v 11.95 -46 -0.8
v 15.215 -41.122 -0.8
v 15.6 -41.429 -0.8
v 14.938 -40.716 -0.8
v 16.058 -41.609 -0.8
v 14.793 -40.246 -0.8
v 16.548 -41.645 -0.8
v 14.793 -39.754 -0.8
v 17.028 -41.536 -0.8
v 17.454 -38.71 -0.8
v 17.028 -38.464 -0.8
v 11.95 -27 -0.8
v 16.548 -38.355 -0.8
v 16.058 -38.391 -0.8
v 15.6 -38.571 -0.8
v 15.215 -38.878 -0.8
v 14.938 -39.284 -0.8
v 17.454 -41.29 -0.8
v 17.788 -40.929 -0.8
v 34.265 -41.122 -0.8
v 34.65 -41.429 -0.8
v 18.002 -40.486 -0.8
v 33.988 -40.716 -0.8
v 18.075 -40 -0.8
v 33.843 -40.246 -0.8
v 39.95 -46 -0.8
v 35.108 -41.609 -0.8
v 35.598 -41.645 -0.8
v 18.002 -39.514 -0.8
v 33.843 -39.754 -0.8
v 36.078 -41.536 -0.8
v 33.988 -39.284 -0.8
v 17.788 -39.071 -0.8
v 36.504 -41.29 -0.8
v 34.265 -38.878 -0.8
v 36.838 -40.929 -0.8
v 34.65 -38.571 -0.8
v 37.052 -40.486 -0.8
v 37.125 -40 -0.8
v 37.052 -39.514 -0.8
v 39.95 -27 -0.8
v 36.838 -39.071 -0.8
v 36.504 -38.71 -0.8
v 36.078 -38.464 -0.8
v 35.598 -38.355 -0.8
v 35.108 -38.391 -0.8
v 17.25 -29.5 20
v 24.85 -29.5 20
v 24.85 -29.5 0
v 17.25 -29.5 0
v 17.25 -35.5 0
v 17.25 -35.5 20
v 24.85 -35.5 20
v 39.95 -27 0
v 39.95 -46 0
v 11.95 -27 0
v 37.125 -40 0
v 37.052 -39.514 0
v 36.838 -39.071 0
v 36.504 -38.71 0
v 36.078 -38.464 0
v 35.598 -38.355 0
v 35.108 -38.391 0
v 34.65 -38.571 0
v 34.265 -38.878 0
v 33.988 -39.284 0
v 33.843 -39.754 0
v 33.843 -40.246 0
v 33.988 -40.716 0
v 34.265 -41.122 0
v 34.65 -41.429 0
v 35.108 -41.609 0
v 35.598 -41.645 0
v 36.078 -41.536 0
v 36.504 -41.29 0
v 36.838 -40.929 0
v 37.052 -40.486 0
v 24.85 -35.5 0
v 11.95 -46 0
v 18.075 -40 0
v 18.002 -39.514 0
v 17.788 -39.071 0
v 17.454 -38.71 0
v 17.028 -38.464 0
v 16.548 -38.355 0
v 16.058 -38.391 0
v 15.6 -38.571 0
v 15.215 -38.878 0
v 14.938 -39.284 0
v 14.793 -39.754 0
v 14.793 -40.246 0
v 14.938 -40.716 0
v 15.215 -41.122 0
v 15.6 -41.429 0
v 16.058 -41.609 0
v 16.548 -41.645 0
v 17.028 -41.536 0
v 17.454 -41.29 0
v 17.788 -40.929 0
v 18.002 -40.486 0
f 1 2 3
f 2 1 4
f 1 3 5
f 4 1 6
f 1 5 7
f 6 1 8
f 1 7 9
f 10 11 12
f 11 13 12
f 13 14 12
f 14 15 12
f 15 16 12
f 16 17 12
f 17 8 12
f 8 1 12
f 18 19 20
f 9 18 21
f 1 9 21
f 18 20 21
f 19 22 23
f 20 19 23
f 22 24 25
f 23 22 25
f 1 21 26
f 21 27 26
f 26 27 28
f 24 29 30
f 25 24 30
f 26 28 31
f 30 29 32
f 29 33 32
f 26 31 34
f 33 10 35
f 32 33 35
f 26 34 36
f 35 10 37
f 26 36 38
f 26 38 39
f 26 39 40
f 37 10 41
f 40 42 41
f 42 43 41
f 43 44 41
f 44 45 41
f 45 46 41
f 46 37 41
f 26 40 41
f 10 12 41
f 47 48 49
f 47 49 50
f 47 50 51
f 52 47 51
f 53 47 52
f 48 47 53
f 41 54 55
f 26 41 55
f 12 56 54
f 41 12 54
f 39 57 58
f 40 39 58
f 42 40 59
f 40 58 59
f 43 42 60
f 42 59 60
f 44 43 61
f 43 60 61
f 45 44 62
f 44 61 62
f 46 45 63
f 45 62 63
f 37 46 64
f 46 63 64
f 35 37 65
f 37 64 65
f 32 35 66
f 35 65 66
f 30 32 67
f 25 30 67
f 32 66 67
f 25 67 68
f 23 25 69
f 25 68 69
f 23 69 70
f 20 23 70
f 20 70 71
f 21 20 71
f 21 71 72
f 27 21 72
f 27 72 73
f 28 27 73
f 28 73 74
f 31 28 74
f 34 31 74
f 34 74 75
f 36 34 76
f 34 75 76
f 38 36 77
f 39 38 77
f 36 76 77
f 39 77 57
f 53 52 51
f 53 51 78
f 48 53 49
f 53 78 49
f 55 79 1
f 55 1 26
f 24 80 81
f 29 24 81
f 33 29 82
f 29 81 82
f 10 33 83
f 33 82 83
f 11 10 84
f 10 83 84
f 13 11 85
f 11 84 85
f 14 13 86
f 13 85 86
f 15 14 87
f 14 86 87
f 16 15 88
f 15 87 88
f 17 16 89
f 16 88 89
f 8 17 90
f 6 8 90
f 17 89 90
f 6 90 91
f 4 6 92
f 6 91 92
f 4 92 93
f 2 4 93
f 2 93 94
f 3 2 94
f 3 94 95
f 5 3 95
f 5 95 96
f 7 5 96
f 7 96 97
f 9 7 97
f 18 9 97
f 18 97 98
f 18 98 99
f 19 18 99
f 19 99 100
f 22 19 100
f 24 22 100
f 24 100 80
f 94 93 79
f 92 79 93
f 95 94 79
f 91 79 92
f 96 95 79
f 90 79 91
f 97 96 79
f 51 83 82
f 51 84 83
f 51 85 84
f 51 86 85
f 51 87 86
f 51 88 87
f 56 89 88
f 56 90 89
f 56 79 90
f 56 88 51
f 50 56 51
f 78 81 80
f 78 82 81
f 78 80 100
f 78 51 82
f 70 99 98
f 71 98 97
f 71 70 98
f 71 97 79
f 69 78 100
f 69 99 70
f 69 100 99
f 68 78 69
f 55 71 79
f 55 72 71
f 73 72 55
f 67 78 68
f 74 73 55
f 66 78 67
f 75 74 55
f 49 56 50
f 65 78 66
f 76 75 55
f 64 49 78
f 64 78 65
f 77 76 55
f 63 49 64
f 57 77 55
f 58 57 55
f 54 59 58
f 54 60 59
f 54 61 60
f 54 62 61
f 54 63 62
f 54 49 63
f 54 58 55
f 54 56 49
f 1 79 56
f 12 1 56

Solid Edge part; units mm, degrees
sketch "Sketch1" plane through (0, 0, 0) normal (0, 0, 1) x (1, 0, 0)
  circle A0 centre (35.475, -40) radius 1.65
  circle A1 centre (16.425, -40) radius 1.65
  line L0 (11.95, -46) -> (39.95, -46)
  line L1 (39.95, -27) -> (39.95, -46)
  line L2 (11.95, -27) -> (39.95, -27)
  line L3 (11.95, -46) -> (11.95, -27)
  dimension "D1" = 19.05
extrude "Protrusion1" add sketch "Sketch1" against normal blind 0.8
sketch "Sketch2" plane through (25.95, -36.5, 0) normal (0, 0, 1) x (1, 0, 0)
  line L0 (-8.7, 1) -> (-1.1, 1)
  line L1 (-1.1, 1) -> (-1.1, 7)
  line L2 (-1.1, 7) -> (-8.7, 7)
  line L3 (-8.7, 7) -> (-8.7, 1)
  dimension "D1" = 6
  dimension "D2" = 7.6
  dimension "D3" = 2.5
  dimension "D4" = 5.3
extrude "ExtrudedProtrusion_2" add sketch "Sketch2" along normal blind 20
properties material "Epoxy, cast rigid"
